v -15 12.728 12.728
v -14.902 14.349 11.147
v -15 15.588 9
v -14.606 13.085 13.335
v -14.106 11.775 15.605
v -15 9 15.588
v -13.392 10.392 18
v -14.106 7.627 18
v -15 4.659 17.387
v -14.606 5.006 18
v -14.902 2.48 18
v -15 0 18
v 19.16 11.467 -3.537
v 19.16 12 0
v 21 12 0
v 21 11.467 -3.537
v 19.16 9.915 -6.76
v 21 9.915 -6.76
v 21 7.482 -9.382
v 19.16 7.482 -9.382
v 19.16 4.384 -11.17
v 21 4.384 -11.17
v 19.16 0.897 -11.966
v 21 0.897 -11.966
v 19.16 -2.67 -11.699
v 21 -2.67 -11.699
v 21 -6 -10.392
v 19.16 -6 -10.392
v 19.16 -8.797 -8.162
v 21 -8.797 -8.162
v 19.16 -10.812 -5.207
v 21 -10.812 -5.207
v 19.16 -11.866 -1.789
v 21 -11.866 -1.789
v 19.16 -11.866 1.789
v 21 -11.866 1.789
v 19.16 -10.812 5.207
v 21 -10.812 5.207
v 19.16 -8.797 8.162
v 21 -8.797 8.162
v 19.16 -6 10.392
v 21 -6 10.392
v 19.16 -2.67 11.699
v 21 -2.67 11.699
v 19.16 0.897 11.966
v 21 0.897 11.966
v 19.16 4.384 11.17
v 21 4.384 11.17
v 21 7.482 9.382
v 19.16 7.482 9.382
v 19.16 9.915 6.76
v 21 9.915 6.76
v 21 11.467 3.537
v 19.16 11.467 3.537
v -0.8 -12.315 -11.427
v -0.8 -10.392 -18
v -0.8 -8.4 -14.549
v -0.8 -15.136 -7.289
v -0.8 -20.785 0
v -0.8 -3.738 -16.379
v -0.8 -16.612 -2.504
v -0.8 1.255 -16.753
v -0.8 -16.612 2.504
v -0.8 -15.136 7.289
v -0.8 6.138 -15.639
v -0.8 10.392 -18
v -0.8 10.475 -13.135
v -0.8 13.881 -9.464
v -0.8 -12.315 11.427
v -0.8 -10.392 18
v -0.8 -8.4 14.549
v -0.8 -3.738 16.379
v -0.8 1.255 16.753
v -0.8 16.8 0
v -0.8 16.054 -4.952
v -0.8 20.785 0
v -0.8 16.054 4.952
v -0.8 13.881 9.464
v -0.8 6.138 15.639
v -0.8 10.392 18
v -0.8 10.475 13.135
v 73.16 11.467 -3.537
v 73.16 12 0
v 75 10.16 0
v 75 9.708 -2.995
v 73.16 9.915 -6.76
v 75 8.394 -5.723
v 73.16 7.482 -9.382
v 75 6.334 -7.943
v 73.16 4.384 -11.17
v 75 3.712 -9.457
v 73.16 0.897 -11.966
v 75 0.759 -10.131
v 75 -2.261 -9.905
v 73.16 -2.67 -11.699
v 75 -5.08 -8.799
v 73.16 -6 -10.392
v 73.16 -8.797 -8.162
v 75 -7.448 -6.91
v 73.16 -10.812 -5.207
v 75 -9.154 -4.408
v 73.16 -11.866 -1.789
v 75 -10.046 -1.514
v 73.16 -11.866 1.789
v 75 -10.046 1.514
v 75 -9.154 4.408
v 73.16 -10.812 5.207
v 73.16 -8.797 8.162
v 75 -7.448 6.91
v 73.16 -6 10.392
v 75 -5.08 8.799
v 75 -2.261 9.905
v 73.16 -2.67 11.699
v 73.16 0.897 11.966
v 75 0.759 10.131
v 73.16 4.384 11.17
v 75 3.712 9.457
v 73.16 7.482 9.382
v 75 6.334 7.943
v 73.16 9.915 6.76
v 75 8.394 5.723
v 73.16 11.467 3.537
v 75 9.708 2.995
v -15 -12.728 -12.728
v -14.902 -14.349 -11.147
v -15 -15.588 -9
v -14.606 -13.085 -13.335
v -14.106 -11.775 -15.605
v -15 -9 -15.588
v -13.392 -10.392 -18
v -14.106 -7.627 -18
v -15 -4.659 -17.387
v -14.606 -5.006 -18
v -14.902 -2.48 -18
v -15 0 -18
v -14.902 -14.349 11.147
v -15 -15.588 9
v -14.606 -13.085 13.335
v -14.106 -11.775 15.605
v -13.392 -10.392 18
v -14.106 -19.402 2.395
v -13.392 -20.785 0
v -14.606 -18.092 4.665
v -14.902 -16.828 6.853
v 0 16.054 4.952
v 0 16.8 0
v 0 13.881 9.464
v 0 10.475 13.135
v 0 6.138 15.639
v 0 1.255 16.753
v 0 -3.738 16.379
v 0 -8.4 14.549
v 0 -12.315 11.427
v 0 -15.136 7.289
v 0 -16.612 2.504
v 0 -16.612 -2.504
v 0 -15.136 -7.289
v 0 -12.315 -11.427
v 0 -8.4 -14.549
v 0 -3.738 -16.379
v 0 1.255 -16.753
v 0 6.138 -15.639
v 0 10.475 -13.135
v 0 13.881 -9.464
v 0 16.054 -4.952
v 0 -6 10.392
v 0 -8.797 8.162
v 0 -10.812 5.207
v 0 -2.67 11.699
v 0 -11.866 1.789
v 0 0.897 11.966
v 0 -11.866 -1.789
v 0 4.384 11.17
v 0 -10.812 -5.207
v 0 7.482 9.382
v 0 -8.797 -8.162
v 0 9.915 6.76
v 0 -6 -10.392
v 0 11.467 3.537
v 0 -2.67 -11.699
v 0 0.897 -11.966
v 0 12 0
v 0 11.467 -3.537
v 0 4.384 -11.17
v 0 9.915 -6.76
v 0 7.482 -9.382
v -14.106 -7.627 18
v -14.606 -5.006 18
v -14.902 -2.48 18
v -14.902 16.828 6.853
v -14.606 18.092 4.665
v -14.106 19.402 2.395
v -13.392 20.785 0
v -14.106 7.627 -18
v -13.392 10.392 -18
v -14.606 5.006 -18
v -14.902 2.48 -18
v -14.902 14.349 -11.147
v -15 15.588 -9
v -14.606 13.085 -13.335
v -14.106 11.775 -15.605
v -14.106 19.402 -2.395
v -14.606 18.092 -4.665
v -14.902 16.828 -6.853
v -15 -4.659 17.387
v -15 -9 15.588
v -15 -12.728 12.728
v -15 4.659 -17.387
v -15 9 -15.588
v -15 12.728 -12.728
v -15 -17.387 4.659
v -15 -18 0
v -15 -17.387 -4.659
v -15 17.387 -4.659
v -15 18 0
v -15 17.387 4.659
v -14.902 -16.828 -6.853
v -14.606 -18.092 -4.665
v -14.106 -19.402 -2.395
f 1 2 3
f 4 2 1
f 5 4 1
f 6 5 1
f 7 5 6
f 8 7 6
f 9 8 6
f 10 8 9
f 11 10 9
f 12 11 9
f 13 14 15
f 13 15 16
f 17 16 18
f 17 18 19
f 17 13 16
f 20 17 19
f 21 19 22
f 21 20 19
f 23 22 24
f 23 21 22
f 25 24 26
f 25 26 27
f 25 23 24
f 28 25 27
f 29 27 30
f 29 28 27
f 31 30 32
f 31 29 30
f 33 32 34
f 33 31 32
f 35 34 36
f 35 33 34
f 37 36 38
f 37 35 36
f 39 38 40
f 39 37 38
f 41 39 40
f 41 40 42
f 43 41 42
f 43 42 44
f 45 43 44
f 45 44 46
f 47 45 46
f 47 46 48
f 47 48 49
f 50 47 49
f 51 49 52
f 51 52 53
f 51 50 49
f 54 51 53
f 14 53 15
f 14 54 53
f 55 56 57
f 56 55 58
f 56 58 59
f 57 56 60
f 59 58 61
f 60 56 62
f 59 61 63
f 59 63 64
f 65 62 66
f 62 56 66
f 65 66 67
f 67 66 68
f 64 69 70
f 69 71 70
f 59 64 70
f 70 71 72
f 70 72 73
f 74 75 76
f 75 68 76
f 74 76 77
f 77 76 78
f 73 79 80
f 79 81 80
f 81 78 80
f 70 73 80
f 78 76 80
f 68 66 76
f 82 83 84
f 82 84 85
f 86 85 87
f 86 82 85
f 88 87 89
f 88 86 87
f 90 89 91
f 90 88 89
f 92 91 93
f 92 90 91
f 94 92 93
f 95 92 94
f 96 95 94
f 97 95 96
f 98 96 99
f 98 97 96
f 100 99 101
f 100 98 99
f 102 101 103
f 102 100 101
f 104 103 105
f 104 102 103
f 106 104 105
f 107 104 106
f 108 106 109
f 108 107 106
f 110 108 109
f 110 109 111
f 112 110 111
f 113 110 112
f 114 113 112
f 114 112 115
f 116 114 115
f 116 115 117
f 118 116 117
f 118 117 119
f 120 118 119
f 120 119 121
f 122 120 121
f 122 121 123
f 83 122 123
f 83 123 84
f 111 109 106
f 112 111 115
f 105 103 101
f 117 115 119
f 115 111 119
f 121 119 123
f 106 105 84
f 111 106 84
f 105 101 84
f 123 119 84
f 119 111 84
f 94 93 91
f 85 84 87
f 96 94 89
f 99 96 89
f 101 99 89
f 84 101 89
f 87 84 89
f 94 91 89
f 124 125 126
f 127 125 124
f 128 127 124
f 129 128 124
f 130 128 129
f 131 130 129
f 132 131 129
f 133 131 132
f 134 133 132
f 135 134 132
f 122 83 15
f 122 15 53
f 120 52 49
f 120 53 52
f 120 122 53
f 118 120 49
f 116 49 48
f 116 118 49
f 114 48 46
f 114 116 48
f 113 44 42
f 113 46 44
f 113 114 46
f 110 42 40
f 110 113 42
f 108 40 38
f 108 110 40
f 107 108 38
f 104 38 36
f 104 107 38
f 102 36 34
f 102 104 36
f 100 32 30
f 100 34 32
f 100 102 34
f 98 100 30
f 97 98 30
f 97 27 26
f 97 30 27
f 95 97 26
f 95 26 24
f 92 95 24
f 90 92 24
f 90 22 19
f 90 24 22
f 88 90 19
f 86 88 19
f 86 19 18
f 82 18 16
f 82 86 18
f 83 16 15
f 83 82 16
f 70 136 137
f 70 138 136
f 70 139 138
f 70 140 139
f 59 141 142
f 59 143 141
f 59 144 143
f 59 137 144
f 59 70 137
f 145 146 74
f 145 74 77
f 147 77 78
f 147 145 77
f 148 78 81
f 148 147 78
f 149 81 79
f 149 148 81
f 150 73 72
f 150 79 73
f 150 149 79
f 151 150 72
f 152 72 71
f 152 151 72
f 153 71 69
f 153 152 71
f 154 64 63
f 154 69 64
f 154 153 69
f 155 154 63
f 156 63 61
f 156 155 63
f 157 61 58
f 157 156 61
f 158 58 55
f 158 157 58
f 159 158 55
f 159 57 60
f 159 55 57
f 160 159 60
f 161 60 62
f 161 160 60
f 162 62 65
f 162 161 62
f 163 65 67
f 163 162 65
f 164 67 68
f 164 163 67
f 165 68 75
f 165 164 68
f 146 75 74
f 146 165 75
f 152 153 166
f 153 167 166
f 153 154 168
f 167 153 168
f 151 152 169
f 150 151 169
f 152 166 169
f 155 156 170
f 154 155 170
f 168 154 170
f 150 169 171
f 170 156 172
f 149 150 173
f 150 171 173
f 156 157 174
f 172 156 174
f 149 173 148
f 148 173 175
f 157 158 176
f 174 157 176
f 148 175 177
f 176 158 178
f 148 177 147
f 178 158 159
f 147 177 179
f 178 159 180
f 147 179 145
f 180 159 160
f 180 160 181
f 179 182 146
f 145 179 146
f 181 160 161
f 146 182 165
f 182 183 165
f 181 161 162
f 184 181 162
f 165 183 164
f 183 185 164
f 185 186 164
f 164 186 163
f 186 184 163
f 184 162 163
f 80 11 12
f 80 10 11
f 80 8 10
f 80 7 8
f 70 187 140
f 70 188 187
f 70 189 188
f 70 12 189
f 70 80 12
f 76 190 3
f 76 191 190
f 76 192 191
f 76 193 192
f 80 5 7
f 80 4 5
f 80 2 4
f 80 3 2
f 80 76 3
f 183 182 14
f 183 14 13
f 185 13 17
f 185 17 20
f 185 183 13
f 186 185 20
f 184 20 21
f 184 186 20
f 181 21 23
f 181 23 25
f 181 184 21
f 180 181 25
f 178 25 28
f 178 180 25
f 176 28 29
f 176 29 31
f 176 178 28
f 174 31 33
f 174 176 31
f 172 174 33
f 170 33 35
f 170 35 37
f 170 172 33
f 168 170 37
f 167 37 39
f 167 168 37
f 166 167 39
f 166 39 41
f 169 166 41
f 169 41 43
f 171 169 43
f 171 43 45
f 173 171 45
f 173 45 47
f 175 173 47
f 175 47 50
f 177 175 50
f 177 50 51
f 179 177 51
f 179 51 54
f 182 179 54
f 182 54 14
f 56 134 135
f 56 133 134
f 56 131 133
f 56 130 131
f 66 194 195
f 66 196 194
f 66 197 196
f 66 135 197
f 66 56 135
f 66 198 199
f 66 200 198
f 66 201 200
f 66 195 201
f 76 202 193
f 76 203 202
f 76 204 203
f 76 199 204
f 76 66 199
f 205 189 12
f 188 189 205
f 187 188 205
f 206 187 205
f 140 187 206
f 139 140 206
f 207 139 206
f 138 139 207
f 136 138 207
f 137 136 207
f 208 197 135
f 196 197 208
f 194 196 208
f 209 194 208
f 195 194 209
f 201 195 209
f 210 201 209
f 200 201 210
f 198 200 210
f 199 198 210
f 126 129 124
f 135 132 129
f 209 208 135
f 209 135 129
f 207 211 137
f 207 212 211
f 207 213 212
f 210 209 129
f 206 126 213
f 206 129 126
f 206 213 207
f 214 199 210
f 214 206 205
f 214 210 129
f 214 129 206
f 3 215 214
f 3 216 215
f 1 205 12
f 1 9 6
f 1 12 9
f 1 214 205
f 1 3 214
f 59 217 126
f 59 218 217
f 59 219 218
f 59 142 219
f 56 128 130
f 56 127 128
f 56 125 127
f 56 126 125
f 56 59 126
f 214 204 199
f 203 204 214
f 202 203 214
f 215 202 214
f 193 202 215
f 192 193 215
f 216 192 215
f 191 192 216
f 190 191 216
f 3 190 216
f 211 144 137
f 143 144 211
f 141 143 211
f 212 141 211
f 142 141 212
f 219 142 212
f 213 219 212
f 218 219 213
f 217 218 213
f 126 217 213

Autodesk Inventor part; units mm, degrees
ref_plane "YZ Plane" through (0, 0, 0) normal (1, 0, 0) x (0, 1, 0)
ref_plane "XZ Plane" through (0, 0, 0) normal (0, 1, 0) x (-1, 0, 0)
sketch "Sketch1" plane through (0, 0, 0) normal (0, 0, 1) x (1, 0, 0)
  line L0 (0, 16.8) -> (0, 12)
  line L1 (21, 12) -> (75, 12)
  line L2 (75, 12) -> (75, 0)
  line L3 (75, 0) -> (-0.8001, 0)
  line L4 (-15.9601, 0) -> (90.16, 0) projected
  line L5 (-0.8001, 0) -> (-0.8001, 16.8)
  line L6 (-0.8001, 16.8) -> (0, 16.8)
  line L7 (21, 12) -> (19.1595, 12)
  line L8 (19.1595, 12) -> (0, 12)
  line L9 (0, -3.36) -> (0, 20.16) projected
  dimension "d0" = 75
  dimension "d1" = 54
  dimension "d2" = 24
  dimension "d9" = 0.8001
  dimension "d10" = 33.6
  dimension "d13" = 1.8404
  dimension "d14" = 24
revolve "Body" add sketch "Sketch1" angle 360 about axis through (75, 0, 0) along (-1, 0, 0)
sketch "Sketch2" plane through (-0.8001, 0, 0) normal (-1, 0, 0) x (0, 0, 1)
  line L0 (0, 20.7846) -> (18, 10.3923)
  line L1 (18, 10.3923) -> (18, -10.3923)
  line L2 (18, -10.3923) -> (0, -20.7846)
  line L3 (0, -20.7846) -> (-18, -10.3923)
  line L4 (-18, -10.3923) -> (-18, 10.3923)
  line L5 (-18, 10.3923) -> (0, 20.7846)
  point P0 (0, 0)
  point P1 (0, 0)
  dimension "d11" = 36
extrude "Head" add sketch "Sketch2" along normal blind 14.2
sketch "Sketch4" plane through (0, 0, 0) normal (0, 0, 1) x (1, 0, 0)
  line L0 (-15.0001, 18) -> (-15.0001, 20.7846)
  line L1 (-15.0001, 20.7846) -> (-13.3924, 20.7846)
  line L2 (-13.3924, 20.7846) -> (-15.0001, 18)
  line L3 (-17.8401, 0) -> (2.0399, 0) projected
  line L4 (-0.8001, 20.7846) -> (-15.0001, 20.7846) projected
  line L5 (-15.0001, 10.3923) -> (-15.0001, 20.7846) projected
  dimension "d5" = 30
  dimension "d19" = 36
revolve "Chamfer1" cut sketch "Sketch4" angle 360 about axis through (-10, 0, 0) along (1, 0, 0)
thread "Thread" size "M24x3" class "6g" standard "ISO Metric profile" length 54
chamfer "Chamfer2" distance 1.8403 distance2 1.8405 1 edges at (75, -12, 0) measured on face at (75, -4.6056, 1.5967)
ref_plane "Work Plane1" through (1.525, 0, 0) normal (0, 0, 1) x (1, 0, 0)
equation "\"d0\" = NLG"
equation "\"d1\" = GEL"
equation "\"d2\" = GD"
equation "\"d10\" = SD2"
equation "\"d14\" = BDM"
equation "\"d11\" = SW"
equation "\"d3\" = KOH - SD"
equation "\"d5\" = ANG1"
equation "\"d19\" = SW0"
equation "\"d15\" = GEL"
equation "\"d6\" = -0.5 * SPD + 0.5 * GD"
equation "\"NLG\" = 75"
equation "\"GD\" = NND"
equation "\"BDM\" = NND"
equation "\"KOH\" = 15"
equation "\"GEL\" = 54"
equation "\"SW\" = 36"
equation "\"SW0\" = SW"
equation "\"SPD\" = NND - 1.2269 * PTC"
equation "\"SD2\" = 33.6"
equation "\"SD\" = 0.8"
equation "\"ANG1\" = 30deg"
equation "\"GAL\" = 0.61345 * PTC"
equation "\"GUL\" = 0.61345 * PTC"
equation "\"RR\" = 0.8"
equation "\"WFT\" = SD"
equation "\"GD1\" = THREADDIA - 1.2269 * PTC"
equation "\"THREADDIA\" = 24"
equation "\"SDH\" = 33.6"
equation "\"TOA\" = 30deg"
equation "\"FAWI\" = 45deg"
equation "\"PTC\" = 3"
equation "\"NND\" = 24"
equation "\"E0\" = 1.155 * SW"
properties part number "Bolt M24x75-8.8-A PN-85/M-82101" material "Steel, Mild"
